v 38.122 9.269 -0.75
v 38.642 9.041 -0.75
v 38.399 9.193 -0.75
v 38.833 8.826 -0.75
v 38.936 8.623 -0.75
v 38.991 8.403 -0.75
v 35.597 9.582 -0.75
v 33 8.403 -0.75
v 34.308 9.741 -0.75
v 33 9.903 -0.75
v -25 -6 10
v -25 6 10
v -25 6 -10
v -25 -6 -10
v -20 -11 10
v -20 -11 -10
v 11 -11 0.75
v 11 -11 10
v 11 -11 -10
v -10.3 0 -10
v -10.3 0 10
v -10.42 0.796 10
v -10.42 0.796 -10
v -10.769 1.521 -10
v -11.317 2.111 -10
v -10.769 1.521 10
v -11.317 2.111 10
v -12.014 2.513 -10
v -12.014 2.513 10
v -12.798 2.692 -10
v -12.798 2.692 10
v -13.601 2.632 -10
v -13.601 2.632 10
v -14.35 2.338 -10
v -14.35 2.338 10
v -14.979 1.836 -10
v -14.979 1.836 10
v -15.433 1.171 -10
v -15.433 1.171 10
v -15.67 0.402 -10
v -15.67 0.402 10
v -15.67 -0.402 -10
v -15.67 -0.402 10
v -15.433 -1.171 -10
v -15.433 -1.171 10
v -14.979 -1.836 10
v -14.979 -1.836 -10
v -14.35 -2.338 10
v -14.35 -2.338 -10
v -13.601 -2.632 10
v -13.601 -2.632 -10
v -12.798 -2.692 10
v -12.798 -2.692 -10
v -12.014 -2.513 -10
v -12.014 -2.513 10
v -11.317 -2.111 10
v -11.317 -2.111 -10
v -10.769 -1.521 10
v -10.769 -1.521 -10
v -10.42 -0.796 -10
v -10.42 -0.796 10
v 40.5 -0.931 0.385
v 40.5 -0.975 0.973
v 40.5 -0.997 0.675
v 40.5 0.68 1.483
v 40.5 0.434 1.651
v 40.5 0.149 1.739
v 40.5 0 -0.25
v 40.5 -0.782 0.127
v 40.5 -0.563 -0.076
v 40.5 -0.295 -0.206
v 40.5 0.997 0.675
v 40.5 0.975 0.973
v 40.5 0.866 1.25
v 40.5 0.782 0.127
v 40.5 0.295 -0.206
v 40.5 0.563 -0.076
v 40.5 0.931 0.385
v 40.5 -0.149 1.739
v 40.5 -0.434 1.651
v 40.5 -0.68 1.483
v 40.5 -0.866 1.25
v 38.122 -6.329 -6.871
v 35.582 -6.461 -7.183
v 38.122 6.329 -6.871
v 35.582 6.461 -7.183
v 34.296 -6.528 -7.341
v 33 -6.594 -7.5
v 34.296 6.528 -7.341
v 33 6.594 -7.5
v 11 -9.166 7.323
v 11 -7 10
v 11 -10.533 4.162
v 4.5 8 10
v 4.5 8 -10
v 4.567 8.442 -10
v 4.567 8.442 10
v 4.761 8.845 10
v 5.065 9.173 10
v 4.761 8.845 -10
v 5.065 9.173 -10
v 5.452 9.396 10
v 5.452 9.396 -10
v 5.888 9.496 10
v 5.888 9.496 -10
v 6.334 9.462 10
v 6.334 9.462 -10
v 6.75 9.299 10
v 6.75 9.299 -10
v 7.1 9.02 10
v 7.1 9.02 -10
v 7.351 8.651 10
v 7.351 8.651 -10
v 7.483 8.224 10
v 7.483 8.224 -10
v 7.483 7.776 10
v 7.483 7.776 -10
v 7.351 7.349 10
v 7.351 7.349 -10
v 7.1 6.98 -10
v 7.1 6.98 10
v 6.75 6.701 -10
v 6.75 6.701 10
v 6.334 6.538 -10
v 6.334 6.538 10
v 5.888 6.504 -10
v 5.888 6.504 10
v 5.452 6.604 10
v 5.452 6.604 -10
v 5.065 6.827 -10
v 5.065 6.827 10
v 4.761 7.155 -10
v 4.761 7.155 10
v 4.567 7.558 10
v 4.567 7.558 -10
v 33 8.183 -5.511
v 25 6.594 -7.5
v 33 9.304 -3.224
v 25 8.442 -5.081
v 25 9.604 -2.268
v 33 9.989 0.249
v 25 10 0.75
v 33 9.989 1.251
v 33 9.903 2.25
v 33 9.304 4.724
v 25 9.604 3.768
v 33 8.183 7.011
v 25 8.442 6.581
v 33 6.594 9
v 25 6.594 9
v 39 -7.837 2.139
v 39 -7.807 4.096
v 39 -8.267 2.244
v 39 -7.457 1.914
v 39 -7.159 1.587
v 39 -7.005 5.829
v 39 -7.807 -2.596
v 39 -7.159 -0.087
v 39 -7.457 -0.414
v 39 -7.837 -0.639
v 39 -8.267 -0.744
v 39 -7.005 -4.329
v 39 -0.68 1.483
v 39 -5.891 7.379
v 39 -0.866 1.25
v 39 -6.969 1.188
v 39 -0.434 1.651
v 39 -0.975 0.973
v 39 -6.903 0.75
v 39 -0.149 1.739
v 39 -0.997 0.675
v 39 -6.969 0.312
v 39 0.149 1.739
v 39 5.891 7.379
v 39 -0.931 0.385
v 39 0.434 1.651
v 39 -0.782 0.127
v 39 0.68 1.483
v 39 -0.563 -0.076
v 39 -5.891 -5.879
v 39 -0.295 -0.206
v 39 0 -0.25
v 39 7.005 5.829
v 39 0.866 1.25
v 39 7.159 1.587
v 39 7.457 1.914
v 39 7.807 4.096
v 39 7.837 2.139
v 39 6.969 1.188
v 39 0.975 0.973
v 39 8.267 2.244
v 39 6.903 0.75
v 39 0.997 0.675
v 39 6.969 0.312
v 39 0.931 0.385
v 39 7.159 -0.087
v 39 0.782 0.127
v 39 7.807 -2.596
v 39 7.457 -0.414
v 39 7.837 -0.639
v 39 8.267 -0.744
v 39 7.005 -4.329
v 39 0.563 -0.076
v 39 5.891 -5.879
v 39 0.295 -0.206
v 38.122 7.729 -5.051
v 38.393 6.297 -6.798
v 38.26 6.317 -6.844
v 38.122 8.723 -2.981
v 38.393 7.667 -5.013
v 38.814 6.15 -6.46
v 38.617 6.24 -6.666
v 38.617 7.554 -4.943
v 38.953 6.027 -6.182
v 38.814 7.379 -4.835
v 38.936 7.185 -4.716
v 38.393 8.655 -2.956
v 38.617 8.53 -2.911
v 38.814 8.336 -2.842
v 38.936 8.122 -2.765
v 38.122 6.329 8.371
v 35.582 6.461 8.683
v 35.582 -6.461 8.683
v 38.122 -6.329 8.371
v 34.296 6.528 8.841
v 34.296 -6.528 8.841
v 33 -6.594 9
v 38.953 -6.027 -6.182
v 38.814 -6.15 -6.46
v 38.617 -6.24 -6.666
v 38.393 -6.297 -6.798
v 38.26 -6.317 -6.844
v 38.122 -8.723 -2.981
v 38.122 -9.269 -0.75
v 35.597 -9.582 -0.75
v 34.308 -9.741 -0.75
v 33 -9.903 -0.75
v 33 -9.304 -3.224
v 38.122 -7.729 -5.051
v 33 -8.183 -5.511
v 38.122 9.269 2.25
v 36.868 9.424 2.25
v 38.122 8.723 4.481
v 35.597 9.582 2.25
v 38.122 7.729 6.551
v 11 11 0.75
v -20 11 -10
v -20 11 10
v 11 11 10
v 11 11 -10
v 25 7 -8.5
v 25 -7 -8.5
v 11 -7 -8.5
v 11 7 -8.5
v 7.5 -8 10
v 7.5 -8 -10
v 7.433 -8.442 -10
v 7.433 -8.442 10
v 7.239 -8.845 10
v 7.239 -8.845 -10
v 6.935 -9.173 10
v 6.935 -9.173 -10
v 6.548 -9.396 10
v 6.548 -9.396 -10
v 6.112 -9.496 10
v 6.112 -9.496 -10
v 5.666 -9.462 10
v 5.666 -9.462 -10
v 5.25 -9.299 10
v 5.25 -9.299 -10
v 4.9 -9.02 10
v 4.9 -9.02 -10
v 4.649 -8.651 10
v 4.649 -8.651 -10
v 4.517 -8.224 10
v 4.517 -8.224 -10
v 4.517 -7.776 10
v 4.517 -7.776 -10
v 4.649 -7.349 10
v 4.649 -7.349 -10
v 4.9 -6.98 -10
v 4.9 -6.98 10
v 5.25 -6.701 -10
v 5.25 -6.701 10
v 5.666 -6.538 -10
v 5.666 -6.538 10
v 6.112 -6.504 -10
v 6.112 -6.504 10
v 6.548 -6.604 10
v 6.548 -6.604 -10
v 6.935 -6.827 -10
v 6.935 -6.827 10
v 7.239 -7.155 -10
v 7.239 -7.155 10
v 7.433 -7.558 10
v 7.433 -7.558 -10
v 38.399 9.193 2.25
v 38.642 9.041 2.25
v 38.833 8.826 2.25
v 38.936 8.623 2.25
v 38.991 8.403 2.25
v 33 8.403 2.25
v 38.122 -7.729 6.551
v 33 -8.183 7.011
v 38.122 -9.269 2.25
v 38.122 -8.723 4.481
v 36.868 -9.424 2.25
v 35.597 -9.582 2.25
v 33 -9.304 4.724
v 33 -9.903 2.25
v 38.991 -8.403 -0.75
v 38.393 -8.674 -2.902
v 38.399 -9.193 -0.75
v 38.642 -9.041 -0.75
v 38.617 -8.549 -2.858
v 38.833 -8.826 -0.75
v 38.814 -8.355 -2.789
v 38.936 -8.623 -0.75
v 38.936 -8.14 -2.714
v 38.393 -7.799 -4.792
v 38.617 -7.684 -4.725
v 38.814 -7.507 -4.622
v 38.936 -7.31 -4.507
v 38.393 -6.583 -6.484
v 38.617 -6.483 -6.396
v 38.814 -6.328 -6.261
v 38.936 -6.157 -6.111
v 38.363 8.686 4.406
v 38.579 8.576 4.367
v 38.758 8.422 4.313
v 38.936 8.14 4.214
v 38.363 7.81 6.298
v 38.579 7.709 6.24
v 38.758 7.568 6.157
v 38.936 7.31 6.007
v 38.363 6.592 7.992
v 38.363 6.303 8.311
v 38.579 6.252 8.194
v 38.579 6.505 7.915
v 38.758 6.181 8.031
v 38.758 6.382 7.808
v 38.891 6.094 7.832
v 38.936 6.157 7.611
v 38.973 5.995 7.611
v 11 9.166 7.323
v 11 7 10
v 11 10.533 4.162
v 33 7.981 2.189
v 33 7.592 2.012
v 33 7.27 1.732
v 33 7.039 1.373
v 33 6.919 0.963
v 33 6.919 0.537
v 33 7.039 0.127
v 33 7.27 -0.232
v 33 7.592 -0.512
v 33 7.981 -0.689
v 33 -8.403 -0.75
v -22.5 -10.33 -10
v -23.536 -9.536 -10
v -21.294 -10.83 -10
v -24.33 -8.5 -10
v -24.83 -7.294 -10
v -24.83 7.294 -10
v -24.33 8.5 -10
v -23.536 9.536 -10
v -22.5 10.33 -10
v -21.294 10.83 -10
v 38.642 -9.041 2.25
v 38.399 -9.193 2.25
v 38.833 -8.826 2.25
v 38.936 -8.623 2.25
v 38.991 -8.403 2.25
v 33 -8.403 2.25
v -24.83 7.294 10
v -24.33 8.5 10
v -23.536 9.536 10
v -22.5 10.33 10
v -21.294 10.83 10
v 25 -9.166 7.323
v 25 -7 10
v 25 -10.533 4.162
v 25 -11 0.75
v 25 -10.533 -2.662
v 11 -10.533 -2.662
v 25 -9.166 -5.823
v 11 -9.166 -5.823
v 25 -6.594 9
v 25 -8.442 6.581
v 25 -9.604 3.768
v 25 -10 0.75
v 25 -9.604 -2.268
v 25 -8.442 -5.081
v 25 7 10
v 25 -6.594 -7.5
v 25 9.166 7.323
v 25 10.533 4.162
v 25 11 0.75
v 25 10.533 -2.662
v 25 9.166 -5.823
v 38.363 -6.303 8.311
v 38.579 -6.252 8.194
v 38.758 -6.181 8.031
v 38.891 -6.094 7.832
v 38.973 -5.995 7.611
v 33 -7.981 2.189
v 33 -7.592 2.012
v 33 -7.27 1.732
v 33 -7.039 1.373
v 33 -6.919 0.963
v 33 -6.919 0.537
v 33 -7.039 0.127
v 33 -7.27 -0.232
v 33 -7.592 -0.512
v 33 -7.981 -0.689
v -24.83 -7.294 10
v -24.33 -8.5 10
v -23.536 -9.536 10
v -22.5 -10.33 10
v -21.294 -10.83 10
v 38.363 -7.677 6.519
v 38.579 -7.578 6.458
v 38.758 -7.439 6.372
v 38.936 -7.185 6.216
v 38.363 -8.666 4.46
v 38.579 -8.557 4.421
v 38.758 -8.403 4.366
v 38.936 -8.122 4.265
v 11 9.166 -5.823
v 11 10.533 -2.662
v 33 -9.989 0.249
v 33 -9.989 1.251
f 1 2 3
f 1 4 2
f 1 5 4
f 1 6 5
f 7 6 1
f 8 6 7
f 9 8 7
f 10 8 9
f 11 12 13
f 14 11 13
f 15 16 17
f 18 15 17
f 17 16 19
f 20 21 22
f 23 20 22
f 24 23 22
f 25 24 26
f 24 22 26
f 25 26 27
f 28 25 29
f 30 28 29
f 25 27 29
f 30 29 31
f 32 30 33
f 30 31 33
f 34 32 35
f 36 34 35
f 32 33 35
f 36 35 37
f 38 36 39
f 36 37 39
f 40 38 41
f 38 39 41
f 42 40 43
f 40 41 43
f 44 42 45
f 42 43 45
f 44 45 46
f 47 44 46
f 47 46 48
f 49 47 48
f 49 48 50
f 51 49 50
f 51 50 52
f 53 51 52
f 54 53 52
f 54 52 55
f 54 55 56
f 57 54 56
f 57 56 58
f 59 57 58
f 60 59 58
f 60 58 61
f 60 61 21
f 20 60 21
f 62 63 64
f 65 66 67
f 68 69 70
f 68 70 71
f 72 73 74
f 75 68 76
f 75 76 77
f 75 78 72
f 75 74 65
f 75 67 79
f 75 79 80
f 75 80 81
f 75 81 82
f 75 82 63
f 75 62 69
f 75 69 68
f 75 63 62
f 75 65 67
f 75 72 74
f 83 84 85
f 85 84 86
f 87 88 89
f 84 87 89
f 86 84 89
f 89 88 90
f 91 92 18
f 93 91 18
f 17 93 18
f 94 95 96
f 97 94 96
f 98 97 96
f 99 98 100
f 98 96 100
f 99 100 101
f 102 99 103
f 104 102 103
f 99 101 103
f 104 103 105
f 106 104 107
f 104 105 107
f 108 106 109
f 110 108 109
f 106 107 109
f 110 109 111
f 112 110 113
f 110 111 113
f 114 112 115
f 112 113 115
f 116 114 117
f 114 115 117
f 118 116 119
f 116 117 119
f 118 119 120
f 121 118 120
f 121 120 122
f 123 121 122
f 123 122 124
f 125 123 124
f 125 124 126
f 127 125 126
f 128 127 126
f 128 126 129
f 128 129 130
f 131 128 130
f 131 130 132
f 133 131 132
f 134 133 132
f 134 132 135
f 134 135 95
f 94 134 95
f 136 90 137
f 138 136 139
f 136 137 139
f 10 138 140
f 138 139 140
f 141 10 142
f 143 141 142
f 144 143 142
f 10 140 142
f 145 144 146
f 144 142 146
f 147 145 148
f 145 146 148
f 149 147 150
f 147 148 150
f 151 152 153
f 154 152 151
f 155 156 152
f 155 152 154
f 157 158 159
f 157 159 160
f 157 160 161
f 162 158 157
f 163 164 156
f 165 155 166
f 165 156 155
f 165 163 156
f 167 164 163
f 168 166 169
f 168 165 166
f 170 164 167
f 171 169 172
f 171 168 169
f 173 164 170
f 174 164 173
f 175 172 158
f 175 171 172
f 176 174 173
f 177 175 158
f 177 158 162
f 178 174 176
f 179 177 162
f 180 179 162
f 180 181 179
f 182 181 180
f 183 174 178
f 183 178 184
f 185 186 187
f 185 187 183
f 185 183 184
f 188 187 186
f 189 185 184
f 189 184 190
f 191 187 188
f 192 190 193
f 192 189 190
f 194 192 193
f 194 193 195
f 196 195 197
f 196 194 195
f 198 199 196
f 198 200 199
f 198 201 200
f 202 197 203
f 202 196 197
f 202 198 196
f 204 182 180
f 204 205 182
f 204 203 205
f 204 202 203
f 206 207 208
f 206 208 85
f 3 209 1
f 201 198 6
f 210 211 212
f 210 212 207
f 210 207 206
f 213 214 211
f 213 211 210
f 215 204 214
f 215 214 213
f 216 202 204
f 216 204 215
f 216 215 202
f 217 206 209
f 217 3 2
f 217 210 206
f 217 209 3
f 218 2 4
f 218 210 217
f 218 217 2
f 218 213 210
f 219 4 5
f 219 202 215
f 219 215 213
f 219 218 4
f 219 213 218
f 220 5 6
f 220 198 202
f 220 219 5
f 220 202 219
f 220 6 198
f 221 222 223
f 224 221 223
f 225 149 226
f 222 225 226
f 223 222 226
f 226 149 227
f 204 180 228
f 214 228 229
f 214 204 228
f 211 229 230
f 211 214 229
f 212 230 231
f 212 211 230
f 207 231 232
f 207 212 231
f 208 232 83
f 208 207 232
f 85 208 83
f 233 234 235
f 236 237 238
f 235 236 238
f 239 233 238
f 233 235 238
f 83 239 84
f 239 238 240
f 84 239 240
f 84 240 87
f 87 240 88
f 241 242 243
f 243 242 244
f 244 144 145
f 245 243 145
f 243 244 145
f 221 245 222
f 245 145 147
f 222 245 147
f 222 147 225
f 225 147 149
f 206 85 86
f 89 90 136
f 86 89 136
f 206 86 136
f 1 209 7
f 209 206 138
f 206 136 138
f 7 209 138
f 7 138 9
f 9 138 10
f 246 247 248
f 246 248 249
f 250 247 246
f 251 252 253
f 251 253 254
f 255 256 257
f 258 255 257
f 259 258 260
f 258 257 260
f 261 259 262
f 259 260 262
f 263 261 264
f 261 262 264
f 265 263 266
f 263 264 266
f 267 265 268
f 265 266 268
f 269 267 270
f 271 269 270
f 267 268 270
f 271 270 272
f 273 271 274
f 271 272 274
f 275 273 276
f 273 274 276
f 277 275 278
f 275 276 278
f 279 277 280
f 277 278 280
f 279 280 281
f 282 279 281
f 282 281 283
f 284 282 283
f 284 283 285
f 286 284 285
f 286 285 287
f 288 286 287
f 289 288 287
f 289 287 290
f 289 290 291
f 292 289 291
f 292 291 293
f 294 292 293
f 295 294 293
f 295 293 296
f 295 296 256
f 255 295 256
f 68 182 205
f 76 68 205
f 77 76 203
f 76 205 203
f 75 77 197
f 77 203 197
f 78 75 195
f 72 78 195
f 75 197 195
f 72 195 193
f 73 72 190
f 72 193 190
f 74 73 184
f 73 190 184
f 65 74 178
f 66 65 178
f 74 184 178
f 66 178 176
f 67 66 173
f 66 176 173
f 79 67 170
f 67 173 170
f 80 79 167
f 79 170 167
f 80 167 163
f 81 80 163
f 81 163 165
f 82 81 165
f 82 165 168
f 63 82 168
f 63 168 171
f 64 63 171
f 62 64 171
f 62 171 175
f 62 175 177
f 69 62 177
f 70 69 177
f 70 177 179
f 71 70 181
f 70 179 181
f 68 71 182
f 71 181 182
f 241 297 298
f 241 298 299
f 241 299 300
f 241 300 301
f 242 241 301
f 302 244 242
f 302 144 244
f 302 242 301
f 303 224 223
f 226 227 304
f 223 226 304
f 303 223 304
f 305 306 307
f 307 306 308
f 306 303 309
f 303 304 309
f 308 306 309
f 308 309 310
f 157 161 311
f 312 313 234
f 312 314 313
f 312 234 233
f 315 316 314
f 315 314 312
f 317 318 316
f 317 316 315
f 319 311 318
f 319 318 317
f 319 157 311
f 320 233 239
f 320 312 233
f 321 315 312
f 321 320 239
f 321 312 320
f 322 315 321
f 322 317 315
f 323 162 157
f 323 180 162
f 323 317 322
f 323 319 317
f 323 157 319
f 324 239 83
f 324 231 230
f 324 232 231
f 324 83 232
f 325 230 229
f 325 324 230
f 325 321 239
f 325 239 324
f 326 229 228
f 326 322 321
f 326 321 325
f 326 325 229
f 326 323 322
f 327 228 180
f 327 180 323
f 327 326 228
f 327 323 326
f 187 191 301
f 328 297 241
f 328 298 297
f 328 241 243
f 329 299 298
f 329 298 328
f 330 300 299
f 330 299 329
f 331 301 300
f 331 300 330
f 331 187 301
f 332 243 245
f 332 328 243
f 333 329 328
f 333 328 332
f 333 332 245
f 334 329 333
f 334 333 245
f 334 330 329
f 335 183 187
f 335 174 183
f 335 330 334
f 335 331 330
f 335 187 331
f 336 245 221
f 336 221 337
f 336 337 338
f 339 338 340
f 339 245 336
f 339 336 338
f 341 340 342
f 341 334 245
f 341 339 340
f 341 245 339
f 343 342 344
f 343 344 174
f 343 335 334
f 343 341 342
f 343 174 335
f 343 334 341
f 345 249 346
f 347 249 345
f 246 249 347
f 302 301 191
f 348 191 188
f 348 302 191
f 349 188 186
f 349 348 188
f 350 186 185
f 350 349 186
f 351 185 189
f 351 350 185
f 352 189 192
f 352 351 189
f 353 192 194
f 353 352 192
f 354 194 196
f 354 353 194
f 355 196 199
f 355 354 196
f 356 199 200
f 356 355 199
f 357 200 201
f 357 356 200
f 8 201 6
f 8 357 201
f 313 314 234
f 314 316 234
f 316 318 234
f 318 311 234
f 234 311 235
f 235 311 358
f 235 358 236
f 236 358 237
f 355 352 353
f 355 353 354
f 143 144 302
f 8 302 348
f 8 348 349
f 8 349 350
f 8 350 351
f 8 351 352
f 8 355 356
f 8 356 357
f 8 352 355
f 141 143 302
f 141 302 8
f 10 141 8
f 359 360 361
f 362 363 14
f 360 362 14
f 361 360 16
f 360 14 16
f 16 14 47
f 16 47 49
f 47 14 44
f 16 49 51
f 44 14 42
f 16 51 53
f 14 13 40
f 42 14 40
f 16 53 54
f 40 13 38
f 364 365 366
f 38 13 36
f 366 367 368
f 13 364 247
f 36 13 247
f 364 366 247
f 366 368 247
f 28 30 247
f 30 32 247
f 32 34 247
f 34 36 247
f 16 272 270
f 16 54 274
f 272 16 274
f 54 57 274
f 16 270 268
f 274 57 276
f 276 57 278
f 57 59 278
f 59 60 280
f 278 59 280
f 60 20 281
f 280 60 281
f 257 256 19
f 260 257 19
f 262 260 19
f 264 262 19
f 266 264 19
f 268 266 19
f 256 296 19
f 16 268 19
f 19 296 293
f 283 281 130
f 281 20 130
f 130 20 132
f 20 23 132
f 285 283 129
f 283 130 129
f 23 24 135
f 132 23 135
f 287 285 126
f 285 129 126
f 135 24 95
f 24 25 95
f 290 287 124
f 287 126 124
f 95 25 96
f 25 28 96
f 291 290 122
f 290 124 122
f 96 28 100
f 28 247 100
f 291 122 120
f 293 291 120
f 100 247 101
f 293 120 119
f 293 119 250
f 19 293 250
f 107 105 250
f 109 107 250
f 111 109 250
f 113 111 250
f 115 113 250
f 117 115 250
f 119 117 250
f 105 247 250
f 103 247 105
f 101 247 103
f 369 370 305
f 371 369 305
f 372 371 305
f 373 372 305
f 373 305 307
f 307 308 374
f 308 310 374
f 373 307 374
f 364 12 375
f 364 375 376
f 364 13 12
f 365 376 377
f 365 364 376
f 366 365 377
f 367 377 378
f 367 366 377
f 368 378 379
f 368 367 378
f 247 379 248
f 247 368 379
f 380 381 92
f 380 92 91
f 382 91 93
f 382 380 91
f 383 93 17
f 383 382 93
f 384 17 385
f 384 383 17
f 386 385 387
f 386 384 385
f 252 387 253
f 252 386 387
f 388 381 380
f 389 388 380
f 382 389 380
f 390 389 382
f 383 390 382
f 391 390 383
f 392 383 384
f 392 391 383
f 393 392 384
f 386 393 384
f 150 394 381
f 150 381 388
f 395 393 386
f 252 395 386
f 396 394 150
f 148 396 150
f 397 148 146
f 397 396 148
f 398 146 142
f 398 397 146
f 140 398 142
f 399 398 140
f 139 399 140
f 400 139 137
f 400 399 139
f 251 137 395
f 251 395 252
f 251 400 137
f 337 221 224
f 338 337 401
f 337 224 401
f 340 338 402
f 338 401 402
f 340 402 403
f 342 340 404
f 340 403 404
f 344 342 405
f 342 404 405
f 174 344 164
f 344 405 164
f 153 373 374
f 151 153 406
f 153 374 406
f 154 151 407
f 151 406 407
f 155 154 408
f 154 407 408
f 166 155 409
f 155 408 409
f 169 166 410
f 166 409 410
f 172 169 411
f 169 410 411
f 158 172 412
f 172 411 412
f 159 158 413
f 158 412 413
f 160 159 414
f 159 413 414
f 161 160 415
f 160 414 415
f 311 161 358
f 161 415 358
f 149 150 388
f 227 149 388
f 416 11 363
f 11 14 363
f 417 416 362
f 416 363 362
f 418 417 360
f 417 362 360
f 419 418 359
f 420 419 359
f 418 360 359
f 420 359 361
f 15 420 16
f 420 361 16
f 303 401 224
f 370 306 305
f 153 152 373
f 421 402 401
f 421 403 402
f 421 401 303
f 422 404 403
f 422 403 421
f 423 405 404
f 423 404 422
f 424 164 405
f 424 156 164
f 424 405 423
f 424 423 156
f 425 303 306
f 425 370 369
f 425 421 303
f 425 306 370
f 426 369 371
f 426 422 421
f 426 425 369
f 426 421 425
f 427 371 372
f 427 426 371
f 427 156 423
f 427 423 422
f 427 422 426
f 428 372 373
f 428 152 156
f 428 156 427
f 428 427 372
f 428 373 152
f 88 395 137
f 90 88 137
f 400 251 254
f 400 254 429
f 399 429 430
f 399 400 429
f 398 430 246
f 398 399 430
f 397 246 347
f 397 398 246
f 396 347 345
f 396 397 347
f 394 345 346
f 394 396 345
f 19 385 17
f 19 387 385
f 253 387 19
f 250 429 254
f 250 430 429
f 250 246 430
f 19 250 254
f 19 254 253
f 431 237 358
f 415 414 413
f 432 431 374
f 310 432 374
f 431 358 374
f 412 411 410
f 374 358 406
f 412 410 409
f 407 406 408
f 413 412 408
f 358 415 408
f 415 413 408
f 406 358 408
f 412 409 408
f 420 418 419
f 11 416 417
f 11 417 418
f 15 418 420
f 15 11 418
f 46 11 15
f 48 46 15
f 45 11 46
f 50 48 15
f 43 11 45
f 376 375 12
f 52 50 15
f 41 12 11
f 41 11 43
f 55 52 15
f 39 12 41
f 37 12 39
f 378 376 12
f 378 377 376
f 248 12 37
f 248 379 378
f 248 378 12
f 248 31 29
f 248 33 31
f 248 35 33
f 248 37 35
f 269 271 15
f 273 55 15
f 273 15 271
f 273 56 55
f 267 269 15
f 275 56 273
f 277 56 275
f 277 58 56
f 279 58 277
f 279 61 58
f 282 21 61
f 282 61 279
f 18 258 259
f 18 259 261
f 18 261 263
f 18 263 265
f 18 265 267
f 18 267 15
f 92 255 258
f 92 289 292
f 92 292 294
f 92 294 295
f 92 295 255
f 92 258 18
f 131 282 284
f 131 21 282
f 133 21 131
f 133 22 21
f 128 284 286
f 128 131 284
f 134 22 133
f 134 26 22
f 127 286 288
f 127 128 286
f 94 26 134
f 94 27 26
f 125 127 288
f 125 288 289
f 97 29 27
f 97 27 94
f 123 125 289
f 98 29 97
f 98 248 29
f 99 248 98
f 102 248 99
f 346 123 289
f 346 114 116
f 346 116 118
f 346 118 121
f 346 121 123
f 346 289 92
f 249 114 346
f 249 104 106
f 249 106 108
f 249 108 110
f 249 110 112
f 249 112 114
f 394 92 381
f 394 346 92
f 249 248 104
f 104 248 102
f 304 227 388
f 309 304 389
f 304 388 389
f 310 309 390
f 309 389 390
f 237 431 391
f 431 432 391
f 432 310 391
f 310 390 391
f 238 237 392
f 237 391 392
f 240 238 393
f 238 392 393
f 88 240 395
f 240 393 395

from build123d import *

# Parameters (mm, degrees)
CROQUIS1_W               = 50
CROQUIS1_H               = 20
SALIENTE_EXTRUIR1_DEPTH  = 11
REDONDEO1_R              = 5
CROQUIS2_OUTSIDE_W       = 33.634
CROQUIS2_OUTSIDE_H       = 35.634
CORTAR_EXTRUIR1_DEPTH    = 14
CROQUIS3_R               = 1.5
CORTAR_EXTRUIR2_DEPTH    = 34.85262176
SALIENTE_EXTRUIR6_DEPTH  = 8
CROQUIS9_R               = 2.7
CORTAR_EXTRUIR5_DEPTH    = 41.124805295
SALIENTE_EXTRUIR7_DEPTH  = 6
SALIENTE_EXTRUIR7_DRAFT  = 7
REDONDEO2_R              = 1
CORTAR_EXTRUIR6_START    = -6
CORTAR_EXTRUIR6_DEPTH    = 6
CROQUIS15_W              = 2
CROQUIS15_H              = 5
SALIENTE_EXTRUIR10_DEPTH = 5.5
CROQUIS16_R              = 1.5
CORTAR_EXTRUIR7_DEPTH    = 42.988093643
CROQUIS17_R              = 1
SALIENTE_EXTRUIR11_DEPTH = 1.5
CORTAR_EXTRUIR8_START    = -5.5
CROQUIS18_W              = 2
CROQUIS18_H              = 5
CORTAR_EXTRUIR8_DEPTH    = 79.039644333


with BuildPart() as part:
    # Croquis1 → Saliente-Extruir1 (new, symmetric)
    with BuildSketch(Plane(origin=(0, 0, 0), x_dir=(1, 0, 0), z_dir=(0, 1, 0))):
        Rectangle(CROQUIS1_W, CROQUIS1_H)
    extrude(amount=SALIENTE_EXTRUIR1_DEPTH, both=True)

    # Redondeo1
    redondeo1_edges = [part.edges().sort_by_distance(p)[0] for p in [
        (-25, 11, 0),
        (-25, -11, 0),
    ]]
    fillet(redondeo1_edges, radius=REDONDEO1_R)

    # Croquis2 outside → Cortar-Extruir1 (cut)
    with BuildSketch(Plane(origin=(25, 0, 0), x_dir=(0, 0, -1), z_dir=(1, 0, 0))):
        Rectangle(CROQUIS2_OUTSIDE_W, CROQUIS2_OUTSIDE_H)
        with BuildLine():
            Line((-10, 7), (-10, -7))
            ThreePointArc((-10, -7), (-0.75, -11), (8.5, -7))
            Line((8.5, -7), (8.5, 7))
            ThreePointArc((8.5, 7), (-0.75, 11), (-10, 7))
        make_face(mode=Mode.SUBTRACT)
    extrude(amount=-CORTAR_EXTRUIR1_DEPTH, mode=Mode.SUBTRACT)

    # Croquis3 → Cortar-Extruir2 (cut, through all)
    with BuildSketch(Plane(origin=(0, 0, -10), x_dir=(-1, 0, 0), z_dir=(0, 0, -1))):
        with Locations((-6, 8)):
            Circle(CROQUIS3_R)
        with Locations(Location((-6, -8, 0), (0, 0, 180))):
            Circle(CROQUIS3_R)
    extrude(amount=-CORTAR_EXTRUIR2_DEPTH, mode=Mode.SUBTRACT)

    # Croquis8 → Saliente-Extruir6 (add)
    with BuildSketch(Plane(origin=(25, 0, 0), x_dir=(0, 0, -1), z_dir=(1, 0, 0))):
        with BuildLine():
            Line((-9, 6.594309595), (-9, -6.594309595))
            ThreePointArc((-9, -6.594309595), (-0.75, -10), (7.5, -6.594309595))
            Line((7.5, -6.594309595), (7.5, 6.594309595))
            ThreePointArc((7.5, 6.594309595), (-0.75, 10), (-9, 6.594309595))
        make_face()
    extrude(amount=SALIENTE_EXTRUIR6_DEPTH)

    # Croquis9 → Cortar-Extruir5 (cut, through all)
    with BuildSketch(Plane.XY.offset(10)):
        with Locations((-13, 0)):
            Circle(CROQUIS9_R)
    extrude(amount=-CORTAR_EXTRUIR5_DEPTH, mode=Mode.SUBTRACT)


with BuildPart() as saliente_extruir7_tool:
    # Croquis11 → Saliente-Extruir7 (with draft: the straight prism first)
    with BuildSketch(Plane(origin=(33, 0, 0), x_dir=(0, 0, -1), z_dir=(1, 0, 0))):
        with BuildLine():
            Line((-9, 6.594309595), (-9, -6.594309595))
            ThreePointArc((-9, -6.594309595), (-0.75, -10), (7.5, -6.594309595))
            Line((7.5, -6.594309595), (7.5, 6.594309595))
            ThreePointArc((7.5, 6.594309595), (-0.75, 10), (-9, 6.594309595))
        make_face()
    extrude(amount=SALIENTE_EXTRUIR7_DEPTH)
    # Saliente-Extruir7: the draft: its side faces are tilted about the plane it starts from
    saliente_extruir7_sides = [saliente_extruir7_tool.faces().sort_by_distance(p)[0] for p in [
        (36, 0, 9),
        (36, -10, 0.75),
        (36, 0, -7.5),
        (36, 10, 0.75),
    ]]
    draft(saliente_extruir7_sides, Plane(origin=(33, 0, 0), x_dir=(0, 0, -1), z_dir=(1, 0, 0)), SALIENTE_EXTRUIR7_DRAFT)


with BuildPart() as part_1:
    add(part.part)

    # Saliente-Extruir7: add saliente_extruir7_tool
    add(saliente_extruir7_tool.part)

    # Redondeo2
    redondeo2_edges = [part_1.edges().sort_by_distance(p)[0] for p in [
        (39, 0, -6.763292635),
        (39, -9.263292635, 0.75),
        (39, 0, 8.263292635),
        (39, 9.263292635, 0.75),
    ]]
    fillet(redondeo2_edges, radius=REDONDEO2_R - 0.0001)  # a hair under: the kernel refuses the full size

    # Croquis14 → Cortar-Extruir6 (cut)
    with BuildSketch(Plane(origin=(39, 0, 0), x_dir=(0, 0, -1), z_dir=(1, 0, 0)).offset(CORTAR_EXTRUIR6_START)):
        with BuildLine():
            Line((-2.25, 9.903408743), (-2.25, 8.403408743))
            ThreePointArc((-2.25, 8.403408743), (-0.75, 6.903408743), (0.75, 8.403408743))
            Line((0.75, 8.403408743), (0.75, 9.903408743))
            ThreePointArc((0.75, 9.903408743), (-0.75, 10), (-2.25, 9.903408743))
        make_face()
        with BuildLine():
            Line((-2.25, -9.903408743), (-2.25, -8.403408743))
            ThreePointArc((-2.25, -8.403408743), (-0.75, -6.903408743), (0.75, -8.403408743))
            Line((0.75, -8.403408743), (0.75, -9.903408743))
            ThreePointArc((0.75, -9.903408743), (-0.75, -10), (-2.25, -9.903408743))
        make_face()
    extrude(amount=CORTAR_EXTRUIR6_DEPTH, mode=Mode.SUBTRACT)

    # Croquis15 → Saliente-Extruir10 (add)
    with BuildSketch(Plane.ZY.offset(25)):
        Rectangle(CROQUIS15_W, CROQUIS15_H)
    extrude(amount=SALIENTE_EXTRUIR10_DEPTH)

    # Croquis16 → Cortar-Extruir7 (cut, through all)
    with BuildSketch(Plane.XY.offset(1)):
        with Locations((-27.75, 0)):
            Circle(CROQUIS16_R)
    extrude(amount=-CORTAR_EXTRUIR7_DEPTH, mode=Mode.SUBTRACT)

    # Croquis17 → Saliente-Extruir11 (add)
    with BuildSketch(Plane(origin=(39, 0, 0), x_dir=(0, 0, -1), z_dir=(1, 0, 0))):
        with Locations((-0.75, 0)):
            Circle(CROQUIS17_R)
    extrude(amount=SALIENTE_EXTRUIR11_DEPTH)

    # Croquis18 → Cortar-Extruir8 (cut, through all)
    with BuildSketch(Plane.ZY.offset(30.5).offset(CORTAR_EXTRUIR8_START)):
        Rectangle(CROQUIS18_W, CROQUIS18_H)
    extrude(amount=CORTAR_EXTRUIR8_DEPTH, mode=Mode.SUBTRACT)


solid = part_1.part
